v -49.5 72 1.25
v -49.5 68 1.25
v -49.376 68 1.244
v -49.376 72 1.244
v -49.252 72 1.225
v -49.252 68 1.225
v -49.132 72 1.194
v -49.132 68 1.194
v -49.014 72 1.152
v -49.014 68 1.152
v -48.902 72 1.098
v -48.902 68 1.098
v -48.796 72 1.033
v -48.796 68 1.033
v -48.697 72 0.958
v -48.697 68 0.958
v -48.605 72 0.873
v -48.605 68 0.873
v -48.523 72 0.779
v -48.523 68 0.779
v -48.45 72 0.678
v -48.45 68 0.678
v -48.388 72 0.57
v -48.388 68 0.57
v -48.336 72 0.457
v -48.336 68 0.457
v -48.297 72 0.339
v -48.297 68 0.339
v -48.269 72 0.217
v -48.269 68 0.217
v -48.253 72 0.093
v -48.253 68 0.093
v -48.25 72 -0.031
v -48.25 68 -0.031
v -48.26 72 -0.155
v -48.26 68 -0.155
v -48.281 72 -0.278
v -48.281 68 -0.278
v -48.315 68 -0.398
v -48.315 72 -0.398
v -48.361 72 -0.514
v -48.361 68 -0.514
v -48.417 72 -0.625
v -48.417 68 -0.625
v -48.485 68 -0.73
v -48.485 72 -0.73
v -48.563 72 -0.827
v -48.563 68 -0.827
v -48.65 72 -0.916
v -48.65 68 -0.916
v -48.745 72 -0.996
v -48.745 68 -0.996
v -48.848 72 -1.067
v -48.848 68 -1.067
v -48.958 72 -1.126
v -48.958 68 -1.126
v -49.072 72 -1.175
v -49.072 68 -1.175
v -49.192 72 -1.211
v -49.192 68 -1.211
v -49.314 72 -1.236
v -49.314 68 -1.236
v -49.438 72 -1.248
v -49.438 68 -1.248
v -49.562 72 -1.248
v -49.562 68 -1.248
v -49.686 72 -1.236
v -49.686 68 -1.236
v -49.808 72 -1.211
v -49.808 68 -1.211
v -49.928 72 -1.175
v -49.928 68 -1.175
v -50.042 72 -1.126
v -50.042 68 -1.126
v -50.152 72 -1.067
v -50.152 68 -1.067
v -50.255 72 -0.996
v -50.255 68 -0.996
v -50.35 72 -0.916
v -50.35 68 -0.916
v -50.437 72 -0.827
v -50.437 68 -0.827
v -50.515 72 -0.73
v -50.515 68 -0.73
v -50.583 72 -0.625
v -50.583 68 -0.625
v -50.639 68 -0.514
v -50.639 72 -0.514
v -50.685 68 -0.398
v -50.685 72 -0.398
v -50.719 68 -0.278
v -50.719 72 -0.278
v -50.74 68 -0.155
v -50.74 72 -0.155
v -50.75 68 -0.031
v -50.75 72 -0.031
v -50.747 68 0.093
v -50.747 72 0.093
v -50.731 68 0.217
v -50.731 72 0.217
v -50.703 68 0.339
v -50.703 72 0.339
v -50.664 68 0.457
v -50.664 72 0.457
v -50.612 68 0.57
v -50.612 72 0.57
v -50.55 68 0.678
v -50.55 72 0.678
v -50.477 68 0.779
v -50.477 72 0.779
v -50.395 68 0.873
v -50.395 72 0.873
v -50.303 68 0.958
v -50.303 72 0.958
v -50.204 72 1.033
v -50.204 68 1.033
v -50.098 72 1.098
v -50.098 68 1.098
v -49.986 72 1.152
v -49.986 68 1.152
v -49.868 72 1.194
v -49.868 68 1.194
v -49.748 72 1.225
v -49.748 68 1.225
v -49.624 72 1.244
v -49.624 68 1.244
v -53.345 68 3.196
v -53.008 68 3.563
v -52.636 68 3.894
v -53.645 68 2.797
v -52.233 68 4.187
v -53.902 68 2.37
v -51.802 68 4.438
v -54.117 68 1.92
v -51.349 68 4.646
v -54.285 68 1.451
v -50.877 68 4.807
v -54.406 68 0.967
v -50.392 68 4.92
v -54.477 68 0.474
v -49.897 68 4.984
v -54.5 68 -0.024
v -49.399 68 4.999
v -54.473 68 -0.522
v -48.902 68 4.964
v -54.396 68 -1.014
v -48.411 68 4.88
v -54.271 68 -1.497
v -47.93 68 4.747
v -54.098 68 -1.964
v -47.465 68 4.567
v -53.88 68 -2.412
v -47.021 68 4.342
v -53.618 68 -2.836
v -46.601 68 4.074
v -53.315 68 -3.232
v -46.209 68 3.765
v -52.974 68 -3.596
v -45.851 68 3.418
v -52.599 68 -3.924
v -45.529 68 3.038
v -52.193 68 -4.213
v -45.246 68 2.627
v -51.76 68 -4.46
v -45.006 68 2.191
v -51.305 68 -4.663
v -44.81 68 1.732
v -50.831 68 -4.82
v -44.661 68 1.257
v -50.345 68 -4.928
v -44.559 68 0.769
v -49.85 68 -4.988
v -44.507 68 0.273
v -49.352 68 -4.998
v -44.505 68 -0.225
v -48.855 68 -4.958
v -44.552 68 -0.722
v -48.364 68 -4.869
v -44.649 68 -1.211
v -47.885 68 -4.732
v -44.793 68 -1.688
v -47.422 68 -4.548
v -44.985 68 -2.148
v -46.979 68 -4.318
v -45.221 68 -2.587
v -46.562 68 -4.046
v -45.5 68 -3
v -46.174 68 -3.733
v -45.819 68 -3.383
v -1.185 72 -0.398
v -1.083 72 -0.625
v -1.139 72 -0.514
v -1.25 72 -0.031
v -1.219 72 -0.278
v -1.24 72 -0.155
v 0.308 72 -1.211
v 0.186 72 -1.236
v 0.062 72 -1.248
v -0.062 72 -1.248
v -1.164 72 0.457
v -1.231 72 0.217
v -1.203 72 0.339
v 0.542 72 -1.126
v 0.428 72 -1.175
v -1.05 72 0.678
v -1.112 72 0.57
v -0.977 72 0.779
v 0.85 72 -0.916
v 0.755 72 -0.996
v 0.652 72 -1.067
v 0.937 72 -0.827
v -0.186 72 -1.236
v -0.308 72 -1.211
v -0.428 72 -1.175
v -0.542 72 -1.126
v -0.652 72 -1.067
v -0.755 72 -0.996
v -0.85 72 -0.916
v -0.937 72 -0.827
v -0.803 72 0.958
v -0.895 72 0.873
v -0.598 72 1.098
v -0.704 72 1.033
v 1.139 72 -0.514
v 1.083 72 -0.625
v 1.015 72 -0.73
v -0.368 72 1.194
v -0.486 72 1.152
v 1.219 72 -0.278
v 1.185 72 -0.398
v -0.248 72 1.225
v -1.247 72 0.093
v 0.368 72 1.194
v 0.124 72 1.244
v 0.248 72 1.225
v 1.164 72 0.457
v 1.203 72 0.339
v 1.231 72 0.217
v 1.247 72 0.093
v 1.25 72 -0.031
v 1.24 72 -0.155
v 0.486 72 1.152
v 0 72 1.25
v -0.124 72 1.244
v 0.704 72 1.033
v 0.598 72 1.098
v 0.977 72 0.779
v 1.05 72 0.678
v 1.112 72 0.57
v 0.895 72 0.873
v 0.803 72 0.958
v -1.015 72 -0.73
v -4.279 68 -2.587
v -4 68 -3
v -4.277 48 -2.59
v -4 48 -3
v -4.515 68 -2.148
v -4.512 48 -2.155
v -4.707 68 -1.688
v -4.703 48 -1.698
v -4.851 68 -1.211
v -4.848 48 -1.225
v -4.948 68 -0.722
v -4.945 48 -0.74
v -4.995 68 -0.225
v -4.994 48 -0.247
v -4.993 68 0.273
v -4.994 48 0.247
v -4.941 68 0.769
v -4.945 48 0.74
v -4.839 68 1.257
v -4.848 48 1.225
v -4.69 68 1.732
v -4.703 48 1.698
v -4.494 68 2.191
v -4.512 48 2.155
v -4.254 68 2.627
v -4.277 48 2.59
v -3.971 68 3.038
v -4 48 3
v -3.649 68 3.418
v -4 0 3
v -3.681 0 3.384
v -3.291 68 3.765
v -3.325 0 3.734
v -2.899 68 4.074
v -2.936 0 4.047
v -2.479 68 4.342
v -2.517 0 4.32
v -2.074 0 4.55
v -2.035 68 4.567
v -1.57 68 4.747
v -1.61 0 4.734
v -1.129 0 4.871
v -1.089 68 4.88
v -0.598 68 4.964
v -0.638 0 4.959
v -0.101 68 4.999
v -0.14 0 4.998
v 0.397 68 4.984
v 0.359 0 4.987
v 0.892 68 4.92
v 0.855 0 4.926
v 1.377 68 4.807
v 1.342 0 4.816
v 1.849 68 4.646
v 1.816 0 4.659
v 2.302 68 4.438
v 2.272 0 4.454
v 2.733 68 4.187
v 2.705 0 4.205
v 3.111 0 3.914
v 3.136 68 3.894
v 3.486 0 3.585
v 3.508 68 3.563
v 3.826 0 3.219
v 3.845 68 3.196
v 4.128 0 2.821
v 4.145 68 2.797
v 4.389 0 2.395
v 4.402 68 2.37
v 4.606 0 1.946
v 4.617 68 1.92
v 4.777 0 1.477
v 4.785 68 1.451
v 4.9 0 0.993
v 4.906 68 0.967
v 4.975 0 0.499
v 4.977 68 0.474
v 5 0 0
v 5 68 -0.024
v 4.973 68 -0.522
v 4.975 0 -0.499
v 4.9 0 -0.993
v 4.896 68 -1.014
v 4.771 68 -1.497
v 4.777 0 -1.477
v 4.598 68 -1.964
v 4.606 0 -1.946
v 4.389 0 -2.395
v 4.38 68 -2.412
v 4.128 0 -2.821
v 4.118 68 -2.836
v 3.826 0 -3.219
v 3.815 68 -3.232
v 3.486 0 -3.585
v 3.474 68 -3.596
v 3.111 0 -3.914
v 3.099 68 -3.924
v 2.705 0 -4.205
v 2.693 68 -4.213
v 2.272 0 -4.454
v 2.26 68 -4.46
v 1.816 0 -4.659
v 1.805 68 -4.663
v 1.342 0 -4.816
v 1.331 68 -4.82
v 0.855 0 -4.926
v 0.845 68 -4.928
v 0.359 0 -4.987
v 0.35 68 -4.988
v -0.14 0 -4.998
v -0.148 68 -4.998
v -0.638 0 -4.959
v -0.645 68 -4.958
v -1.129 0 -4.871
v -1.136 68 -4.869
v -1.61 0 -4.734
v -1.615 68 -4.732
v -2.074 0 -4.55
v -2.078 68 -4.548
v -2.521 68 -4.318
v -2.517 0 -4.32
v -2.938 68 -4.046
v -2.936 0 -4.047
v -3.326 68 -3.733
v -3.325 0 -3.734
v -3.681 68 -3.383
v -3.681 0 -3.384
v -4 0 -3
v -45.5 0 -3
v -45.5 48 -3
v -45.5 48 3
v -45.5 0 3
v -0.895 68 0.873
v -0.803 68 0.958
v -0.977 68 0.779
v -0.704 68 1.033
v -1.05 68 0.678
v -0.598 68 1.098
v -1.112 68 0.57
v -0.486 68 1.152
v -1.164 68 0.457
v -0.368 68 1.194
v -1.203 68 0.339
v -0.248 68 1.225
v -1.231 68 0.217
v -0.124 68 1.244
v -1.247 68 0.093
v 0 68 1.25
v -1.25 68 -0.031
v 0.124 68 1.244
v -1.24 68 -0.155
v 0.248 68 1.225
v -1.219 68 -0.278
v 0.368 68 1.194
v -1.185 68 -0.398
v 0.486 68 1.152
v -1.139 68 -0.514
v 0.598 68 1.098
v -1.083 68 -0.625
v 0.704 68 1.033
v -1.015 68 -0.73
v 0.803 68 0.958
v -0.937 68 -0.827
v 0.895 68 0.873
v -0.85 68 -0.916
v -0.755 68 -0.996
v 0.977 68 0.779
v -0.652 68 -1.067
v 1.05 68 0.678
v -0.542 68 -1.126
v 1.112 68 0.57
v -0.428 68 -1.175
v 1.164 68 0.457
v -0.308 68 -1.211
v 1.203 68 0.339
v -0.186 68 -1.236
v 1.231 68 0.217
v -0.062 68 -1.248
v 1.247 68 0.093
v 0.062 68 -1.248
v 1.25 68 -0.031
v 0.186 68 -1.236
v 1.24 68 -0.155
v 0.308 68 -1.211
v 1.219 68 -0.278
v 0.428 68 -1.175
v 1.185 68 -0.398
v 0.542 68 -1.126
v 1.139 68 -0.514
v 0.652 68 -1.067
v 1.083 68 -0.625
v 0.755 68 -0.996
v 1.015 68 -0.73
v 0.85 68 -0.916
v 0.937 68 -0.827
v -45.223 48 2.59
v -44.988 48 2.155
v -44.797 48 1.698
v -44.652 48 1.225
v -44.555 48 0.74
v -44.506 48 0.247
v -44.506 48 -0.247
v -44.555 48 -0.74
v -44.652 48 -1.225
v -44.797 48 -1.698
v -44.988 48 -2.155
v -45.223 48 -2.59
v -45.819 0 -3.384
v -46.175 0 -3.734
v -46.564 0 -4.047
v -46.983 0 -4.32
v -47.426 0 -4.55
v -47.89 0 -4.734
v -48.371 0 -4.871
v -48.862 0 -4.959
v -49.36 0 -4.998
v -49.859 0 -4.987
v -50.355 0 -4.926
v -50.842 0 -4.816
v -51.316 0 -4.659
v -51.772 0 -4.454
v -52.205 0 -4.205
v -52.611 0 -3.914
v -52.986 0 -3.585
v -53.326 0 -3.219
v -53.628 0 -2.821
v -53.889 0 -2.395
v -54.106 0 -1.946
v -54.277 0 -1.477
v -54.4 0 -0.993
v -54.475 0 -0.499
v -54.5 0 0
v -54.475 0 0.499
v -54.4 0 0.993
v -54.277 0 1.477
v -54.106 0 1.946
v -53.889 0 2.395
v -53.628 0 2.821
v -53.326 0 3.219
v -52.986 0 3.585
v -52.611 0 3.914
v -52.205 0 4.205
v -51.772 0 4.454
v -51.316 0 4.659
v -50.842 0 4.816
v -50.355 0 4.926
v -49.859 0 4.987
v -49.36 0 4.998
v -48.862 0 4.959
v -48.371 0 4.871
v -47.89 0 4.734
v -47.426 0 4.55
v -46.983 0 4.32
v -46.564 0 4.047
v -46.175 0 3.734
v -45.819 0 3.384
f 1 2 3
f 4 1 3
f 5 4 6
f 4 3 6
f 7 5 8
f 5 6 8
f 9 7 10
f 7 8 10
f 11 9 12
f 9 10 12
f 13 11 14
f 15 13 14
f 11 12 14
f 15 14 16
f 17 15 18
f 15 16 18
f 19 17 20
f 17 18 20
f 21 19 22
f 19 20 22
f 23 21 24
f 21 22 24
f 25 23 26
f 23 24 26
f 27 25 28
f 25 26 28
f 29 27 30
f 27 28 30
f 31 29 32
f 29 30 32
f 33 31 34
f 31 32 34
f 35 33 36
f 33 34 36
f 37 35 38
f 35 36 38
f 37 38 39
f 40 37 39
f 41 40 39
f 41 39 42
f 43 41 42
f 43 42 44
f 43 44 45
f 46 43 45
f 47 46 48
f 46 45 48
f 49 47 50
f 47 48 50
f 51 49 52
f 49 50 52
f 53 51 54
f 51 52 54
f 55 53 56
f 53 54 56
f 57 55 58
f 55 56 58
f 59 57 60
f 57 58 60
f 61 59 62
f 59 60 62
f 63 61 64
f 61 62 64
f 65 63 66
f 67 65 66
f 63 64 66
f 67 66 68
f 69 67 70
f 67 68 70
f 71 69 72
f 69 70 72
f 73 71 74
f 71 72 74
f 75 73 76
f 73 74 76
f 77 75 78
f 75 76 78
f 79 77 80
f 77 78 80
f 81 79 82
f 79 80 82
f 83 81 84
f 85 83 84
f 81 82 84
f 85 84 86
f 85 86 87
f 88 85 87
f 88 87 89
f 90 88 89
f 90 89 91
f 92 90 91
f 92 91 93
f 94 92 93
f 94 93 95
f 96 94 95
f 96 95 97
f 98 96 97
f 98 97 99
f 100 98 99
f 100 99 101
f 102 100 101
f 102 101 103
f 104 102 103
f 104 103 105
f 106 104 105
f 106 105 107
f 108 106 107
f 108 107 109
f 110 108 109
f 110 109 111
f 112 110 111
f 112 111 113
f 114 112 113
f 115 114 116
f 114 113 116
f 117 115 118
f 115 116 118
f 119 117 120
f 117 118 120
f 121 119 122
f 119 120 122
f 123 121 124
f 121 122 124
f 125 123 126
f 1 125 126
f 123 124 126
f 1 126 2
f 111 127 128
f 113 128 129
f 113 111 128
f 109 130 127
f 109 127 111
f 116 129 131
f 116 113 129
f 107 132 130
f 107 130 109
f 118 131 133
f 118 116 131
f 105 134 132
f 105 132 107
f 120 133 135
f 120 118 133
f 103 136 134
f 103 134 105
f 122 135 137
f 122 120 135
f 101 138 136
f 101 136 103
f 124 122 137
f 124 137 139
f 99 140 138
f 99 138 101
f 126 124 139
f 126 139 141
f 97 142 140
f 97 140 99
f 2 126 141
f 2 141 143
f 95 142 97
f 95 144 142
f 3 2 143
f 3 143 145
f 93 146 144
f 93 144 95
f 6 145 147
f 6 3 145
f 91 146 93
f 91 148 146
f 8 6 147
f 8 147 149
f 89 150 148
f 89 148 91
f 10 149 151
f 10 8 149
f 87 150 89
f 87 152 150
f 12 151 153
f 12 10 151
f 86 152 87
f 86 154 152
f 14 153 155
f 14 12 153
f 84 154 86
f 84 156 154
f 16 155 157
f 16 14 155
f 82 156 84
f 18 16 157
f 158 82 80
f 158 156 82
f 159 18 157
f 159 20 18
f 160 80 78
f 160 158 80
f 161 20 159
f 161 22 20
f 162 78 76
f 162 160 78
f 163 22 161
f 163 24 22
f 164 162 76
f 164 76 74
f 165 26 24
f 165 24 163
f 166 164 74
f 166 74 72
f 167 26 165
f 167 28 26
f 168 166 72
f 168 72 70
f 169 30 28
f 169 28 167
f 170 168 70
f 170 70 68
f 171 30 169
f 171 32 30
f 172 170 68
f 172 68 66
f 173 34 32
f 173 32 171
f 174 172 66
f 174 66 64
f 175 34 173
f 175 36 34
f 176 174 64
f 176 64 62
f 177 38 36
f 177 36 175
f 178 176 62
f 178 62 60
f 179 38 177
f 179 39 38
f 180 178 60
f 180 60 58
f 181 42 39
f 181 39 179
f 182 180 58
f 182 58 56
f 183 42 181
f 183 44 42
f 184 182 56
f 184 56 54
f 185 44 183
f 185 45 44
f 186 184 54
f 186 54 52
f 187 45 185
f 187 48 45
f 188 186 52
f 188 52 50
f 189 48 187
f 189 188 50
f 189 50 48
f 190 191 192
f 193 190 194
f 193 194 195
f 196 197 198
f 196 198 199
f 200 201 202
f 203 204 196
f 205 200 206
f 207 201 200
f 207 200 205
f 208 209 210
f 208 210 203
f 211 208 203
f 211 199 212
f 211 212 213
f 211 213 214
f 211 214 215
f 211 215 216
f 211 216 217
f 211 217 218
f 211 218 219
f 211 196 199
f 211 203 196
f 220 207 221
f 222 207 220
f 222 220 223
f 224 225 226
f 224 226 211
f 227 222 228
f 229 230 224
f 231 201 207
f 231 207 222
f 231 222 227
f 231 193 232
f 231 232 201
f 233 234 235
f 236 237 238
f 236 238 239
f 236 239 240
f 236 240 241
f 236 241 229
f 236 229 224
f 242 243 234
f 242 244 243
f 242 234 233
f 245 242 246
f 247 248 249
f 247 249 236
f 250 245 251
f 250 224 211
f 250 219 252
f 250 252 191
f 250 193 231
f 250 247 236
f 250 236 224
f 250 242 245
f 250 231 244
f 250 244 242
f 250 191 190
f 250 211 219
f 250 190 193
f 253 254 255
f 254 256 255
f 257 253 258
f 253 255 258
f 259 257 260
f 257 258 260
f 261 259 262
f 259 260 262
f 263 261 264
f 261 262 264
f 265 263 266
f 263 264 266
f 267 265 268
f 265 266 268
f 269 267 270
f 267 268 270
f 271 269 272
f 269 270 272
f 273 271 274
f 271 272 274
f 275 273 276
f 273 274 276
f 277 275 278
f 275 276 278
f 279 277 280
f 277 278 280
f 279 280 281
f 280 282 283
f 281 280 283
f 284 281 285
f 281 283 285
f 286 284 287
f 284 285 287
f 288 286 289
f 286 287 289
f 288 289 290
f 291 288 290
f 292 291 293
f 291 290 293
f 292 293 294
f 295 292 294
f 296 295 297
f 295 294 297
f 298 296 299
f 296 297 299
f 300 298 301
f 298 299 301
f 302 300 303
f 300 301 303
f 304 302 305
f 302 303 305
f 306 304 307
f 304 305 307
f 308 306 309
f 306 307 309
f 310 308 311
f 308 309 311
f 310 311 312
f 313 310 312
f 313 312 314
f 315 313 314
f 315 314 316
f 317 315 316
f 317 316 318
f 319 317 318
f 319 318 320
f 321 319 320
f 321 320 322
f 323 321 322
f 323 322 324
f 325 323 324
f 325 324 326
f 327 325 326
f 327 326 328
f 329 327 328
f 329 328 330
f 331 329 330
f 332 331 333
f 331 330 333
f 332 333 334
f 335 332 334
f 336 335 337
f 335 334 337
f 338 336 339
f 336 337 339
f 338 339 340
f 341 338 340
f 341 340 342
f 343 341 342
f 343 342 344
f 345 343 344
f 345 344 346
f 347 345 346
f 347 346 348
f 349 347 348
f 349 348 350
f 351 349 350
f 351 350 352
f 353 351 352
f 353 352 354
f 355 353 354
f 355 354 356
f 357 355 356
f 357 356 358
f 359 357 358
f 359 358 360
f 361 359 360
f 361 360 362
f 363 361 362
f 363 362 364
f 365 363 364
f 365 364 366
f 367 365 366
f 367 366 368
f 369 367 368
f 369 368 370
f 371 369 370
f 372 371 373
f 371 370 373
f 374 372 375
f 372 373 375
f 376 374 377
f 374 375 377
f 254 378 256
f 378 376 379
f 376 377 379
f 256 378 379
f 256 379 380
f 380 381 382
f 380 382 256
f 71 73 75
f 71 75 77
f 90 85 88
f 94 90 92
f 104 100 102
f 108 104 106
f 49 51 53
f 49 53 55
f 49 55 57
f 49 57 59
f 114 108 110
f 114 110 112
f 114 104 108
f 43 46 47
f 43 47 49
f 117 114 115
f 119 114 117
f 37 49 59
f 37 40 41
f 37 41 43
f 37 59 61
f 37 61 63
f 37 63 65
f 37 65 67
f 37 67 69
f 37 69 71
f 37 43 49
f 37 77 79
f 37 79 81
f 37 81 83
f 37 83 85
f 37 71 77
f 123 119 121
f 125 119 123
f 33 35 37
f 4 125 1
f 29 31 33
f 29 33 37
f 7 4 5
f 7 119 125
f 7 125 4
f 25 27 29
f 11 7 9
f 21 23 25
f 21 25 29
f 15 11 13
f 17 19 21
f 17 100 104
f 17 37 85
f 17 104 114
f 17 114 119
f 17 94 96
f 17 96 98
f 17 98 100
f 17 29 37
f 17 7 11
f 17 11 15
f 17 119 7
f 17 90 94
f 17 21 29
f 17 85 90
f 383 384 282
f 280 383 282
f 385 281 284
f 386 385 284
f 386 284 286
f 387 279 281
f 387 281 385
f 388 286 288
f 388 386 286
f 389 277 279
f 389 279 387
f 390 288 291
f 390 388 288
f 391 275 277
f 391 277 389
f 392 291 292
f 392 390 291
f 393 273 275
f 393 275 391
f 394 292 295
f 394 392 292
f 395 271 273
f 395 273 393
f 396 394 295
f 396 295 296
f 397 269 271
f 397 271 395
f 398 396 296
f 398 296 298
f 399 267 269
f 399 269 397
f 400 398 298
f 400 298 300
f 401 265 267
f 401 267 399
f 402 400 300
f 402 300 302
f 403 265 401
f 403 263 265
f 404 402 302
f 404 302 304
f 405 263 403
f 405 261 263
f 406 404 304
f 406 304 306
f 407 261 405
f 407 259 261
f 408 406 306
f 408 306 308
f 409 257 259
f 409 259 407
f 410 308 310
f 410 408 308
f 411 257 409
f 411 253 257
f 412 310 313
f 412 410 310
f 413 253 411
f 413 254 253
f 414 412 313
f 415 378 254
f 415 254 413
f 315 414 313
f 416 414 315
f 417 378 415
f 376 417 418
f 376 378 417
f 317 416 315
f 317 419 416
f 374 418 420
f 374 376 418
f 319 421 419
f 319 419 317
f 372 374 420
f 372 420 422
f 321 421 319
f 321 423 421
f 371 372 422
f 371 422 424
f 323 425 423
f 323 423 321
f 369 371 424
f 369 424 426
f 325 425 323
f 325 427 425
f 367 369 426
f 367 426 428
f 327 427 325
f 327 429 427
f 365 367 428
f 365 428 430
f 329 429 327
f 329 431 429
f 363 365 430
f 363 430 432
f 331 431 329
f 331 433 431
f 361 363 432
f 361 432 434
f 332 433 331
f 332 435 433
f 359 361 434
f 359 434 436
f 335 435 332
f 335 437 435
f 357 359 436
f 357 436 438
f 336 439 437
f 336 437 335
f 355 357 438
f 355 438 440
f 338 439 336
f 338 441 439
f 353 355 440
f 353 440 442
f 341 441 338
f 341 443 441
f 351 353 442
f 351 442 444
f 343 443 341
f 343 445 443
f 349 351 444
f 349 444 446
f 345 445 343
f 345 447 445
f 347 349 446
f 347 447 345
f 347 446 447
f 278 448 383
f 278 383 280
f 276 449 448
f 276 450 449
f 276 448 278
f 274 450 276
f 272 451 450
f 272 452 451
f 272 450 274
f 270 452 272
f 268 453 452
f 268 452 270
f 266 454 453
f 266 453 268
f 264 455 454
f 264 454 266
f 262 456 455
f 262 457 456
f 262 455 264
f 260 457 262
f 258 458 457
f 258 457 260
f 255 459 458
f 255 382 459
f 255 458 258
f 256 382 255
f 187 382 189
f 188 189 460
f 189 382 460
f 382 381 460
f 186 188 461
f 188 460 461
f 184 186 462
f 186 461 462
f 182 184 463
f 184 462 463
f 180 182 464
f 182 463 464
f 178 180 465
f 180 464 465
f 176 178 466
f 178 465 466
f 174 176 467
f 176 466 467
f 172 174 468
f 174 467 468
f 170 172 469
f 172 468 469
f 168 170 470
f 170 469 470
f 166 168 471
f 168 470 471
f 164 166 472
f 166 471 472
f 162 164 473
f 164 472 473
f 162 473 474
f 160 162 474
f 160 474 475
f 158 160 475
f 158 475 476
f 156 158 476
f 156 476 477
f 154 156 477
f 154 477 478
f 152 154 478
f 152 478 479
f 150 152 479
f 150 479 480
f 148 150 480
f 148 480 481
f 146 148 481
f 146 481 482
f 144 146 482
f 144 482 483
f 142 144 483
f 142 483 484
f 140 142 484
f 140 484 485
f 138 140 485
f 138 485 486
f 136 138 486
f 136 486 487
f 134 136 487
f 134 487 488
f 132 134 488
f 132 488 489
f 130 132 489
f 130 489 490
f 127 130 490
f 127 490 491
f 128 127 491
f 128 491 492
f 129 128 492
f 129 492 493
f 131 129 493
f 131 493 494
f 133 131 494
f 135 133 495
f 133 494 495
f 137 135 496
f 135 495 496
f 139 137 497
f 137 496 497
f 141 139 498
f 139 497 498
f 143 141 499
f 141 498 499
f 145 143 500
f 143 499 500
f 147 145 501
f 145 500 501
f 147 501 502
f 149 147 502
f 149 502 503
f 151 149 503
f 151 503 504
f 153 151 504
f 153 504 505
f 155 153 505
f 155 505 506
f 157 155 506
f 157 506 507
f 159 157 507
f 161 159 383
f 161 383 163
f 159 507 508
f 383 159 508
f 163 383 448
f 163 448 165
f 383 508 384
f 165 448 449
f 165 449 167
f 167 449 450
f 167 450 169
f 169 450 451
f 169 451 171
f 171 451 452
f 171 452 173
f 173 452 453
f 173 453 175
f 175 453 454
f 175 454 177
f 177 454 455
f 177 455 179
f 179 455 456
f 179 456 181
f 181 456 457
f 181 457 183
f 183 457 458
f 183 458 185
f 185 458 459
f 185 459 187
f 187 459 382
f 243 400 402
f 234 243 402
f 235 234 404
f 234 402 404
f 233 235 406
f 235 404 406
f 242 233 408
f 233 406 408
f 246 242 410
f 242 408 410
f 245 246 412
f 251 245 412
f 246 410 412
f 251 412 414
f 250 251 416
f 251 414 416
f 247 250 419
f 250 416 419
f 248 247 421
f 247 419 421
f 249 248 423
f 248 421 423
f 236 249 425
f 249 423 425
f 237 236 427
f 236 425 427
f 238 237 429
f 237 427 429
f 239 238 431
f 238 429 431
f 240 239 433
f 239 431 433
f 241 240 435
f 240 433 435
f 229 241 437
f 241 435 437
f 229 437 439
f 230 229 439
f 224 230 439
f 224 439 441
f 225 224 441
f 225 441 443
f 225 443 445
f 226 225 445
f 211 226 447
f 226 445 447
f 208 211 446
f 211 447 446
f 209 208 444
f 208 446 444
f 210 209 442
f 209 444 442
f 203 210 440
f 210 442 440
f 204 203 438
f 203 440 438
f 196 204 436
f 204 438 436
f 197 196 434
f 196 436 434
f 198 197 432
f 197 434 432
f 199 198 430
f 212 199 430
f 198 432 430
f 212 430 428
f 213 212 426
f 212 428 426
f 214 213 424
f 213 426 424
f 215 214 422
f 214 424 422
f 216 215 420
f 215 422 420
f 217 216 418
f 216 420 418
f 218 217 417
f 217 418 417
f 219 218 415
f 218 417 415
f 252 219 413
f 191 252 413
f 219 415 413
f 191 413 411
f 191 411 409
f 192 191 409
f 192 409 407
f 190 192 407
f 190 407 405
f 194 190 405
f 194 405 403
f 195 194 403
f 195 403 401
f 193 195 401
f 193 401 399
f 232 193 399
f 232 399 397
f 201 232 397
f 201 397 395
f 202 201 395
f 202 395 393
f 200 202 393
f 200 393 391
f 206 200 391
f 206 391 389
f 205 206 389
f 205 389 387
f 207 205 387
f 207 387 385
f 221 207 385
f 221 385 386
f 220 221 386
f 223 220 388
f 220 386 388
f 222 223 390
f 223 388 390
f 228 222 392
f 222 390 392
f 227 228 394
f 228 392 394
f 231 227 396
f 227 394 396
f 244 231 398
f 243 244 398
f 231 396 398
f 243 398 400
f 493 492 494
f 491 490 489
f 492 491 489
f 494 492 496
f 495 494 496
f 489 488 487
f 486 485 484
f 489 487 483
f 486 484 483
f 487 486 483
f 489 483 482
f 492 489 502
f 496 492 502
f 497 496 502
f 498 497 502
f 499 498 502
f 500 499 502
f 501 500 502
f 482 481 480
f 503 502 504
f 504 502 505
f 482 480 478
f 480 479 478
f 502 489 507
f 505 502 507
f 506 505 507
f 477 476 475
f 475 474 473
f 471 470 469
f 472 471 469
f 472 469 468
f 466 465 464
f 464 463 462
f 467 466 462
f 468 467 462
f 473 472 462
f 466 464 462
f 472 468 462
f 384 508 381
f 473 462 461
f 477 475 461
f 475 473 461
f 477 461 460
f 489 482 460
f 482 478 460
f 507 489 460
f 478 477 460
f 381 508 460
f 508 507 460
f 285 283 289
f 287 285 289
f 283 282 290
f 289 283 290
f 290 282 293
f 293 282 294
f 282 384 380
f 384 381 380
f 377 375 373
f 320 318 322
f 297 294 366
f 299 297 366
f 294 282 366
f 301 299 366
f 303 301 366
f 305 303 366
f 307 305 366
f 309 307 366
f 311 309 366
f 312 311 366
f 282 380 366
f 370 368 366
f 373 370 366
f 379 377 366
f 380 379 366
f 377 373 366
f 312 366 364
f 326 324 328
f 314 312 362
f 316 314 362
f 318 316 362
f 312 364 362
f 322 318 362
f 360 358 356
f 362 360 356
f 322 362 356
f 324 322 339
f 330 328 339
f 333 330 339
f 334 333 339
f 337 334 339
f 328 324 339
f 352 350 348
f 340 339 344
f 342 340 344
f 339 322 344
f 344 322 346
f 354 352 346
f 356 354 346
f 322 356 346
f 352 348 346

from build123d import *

# Parameters (mm, degrees)
SKETCH1_R           = 5
SKETCH1_W           = 49.5
SKETCH1_H           = 6
BOSS_EXTRUDE2_DEPTH = 68
SKETCH2_R           = 1.25
BOSS_EXTRUDE3_DEPTH = 4
CUT_EXTRUDE1_START  = -20
SKETCH3_W           = 77.654098362
SKETCH3_H           = 40.574365012
SKETCH3_R           = 5
CUT_EXTRUDE1_DEPTH  = 20


with BuildPart() as part:
    # Sketch1 → Boss-Extrude2 (new body)
    with BuildSketch(Plane(origin=(0, 0, 0), x_dir=(1, 0, 0), z_dir=(0, 1, 0))):
        Circle(SKETCH1_R)
        with Locations((-49.5, 0)):
            Circle(SKETCH1_R)
        with Locations((-24.75, 0)):
            Rectangle(SKETCH1_W, SKETCH1_H)
    extrude(amount=BOSS_EXTRUDE2_DEPTH)

    # Sketch2 → Boss-Extrude3 (add)
    with BuildSketch(Plane(origin=(0, 68, 0), x_dir=(1, 0, 0), z_dir=(0, 1, 0))):
        with Locations(Location((0, 0, 0), (0, 0, 270))):
            Circle(SKETCH2_R)
        with Locations(Location((-49.5, 0, 0), (0, 0, 270))):
            Circle(SKETCH2_R)
    extrude(amount=BOSS_EXTRUDE3_DEPTH)

    # Sketch3 → Cut-Extrude1 (cut)
    with BuildSketch(Plane(origin=(0, 68, 0), x_dir=(1, 0, 0), z_dir=(0, 1, 0)).offset(CUT_EXTRUDE1_START)):
        with Locations((-24.75, -3)):
            Rectangle(SKETCH3_W, SKETCH3_H)
        with Locations(Location((-49.5, 0, 0), (0, 0, 36.869897646))):
            Circle(SKETCH3_R, mode=Mode.SUBTRACT)
        with Locations(Location((0, 0, 0), (0, 0, 143.130102354))):
            Circle(SKETCH3_R, mode=Mode.SUBTRACT)
    extrude(amount=CUT_EXTRUDE1_DEPTH, mode=Mode.SUBTRACT)


solid = part.part
